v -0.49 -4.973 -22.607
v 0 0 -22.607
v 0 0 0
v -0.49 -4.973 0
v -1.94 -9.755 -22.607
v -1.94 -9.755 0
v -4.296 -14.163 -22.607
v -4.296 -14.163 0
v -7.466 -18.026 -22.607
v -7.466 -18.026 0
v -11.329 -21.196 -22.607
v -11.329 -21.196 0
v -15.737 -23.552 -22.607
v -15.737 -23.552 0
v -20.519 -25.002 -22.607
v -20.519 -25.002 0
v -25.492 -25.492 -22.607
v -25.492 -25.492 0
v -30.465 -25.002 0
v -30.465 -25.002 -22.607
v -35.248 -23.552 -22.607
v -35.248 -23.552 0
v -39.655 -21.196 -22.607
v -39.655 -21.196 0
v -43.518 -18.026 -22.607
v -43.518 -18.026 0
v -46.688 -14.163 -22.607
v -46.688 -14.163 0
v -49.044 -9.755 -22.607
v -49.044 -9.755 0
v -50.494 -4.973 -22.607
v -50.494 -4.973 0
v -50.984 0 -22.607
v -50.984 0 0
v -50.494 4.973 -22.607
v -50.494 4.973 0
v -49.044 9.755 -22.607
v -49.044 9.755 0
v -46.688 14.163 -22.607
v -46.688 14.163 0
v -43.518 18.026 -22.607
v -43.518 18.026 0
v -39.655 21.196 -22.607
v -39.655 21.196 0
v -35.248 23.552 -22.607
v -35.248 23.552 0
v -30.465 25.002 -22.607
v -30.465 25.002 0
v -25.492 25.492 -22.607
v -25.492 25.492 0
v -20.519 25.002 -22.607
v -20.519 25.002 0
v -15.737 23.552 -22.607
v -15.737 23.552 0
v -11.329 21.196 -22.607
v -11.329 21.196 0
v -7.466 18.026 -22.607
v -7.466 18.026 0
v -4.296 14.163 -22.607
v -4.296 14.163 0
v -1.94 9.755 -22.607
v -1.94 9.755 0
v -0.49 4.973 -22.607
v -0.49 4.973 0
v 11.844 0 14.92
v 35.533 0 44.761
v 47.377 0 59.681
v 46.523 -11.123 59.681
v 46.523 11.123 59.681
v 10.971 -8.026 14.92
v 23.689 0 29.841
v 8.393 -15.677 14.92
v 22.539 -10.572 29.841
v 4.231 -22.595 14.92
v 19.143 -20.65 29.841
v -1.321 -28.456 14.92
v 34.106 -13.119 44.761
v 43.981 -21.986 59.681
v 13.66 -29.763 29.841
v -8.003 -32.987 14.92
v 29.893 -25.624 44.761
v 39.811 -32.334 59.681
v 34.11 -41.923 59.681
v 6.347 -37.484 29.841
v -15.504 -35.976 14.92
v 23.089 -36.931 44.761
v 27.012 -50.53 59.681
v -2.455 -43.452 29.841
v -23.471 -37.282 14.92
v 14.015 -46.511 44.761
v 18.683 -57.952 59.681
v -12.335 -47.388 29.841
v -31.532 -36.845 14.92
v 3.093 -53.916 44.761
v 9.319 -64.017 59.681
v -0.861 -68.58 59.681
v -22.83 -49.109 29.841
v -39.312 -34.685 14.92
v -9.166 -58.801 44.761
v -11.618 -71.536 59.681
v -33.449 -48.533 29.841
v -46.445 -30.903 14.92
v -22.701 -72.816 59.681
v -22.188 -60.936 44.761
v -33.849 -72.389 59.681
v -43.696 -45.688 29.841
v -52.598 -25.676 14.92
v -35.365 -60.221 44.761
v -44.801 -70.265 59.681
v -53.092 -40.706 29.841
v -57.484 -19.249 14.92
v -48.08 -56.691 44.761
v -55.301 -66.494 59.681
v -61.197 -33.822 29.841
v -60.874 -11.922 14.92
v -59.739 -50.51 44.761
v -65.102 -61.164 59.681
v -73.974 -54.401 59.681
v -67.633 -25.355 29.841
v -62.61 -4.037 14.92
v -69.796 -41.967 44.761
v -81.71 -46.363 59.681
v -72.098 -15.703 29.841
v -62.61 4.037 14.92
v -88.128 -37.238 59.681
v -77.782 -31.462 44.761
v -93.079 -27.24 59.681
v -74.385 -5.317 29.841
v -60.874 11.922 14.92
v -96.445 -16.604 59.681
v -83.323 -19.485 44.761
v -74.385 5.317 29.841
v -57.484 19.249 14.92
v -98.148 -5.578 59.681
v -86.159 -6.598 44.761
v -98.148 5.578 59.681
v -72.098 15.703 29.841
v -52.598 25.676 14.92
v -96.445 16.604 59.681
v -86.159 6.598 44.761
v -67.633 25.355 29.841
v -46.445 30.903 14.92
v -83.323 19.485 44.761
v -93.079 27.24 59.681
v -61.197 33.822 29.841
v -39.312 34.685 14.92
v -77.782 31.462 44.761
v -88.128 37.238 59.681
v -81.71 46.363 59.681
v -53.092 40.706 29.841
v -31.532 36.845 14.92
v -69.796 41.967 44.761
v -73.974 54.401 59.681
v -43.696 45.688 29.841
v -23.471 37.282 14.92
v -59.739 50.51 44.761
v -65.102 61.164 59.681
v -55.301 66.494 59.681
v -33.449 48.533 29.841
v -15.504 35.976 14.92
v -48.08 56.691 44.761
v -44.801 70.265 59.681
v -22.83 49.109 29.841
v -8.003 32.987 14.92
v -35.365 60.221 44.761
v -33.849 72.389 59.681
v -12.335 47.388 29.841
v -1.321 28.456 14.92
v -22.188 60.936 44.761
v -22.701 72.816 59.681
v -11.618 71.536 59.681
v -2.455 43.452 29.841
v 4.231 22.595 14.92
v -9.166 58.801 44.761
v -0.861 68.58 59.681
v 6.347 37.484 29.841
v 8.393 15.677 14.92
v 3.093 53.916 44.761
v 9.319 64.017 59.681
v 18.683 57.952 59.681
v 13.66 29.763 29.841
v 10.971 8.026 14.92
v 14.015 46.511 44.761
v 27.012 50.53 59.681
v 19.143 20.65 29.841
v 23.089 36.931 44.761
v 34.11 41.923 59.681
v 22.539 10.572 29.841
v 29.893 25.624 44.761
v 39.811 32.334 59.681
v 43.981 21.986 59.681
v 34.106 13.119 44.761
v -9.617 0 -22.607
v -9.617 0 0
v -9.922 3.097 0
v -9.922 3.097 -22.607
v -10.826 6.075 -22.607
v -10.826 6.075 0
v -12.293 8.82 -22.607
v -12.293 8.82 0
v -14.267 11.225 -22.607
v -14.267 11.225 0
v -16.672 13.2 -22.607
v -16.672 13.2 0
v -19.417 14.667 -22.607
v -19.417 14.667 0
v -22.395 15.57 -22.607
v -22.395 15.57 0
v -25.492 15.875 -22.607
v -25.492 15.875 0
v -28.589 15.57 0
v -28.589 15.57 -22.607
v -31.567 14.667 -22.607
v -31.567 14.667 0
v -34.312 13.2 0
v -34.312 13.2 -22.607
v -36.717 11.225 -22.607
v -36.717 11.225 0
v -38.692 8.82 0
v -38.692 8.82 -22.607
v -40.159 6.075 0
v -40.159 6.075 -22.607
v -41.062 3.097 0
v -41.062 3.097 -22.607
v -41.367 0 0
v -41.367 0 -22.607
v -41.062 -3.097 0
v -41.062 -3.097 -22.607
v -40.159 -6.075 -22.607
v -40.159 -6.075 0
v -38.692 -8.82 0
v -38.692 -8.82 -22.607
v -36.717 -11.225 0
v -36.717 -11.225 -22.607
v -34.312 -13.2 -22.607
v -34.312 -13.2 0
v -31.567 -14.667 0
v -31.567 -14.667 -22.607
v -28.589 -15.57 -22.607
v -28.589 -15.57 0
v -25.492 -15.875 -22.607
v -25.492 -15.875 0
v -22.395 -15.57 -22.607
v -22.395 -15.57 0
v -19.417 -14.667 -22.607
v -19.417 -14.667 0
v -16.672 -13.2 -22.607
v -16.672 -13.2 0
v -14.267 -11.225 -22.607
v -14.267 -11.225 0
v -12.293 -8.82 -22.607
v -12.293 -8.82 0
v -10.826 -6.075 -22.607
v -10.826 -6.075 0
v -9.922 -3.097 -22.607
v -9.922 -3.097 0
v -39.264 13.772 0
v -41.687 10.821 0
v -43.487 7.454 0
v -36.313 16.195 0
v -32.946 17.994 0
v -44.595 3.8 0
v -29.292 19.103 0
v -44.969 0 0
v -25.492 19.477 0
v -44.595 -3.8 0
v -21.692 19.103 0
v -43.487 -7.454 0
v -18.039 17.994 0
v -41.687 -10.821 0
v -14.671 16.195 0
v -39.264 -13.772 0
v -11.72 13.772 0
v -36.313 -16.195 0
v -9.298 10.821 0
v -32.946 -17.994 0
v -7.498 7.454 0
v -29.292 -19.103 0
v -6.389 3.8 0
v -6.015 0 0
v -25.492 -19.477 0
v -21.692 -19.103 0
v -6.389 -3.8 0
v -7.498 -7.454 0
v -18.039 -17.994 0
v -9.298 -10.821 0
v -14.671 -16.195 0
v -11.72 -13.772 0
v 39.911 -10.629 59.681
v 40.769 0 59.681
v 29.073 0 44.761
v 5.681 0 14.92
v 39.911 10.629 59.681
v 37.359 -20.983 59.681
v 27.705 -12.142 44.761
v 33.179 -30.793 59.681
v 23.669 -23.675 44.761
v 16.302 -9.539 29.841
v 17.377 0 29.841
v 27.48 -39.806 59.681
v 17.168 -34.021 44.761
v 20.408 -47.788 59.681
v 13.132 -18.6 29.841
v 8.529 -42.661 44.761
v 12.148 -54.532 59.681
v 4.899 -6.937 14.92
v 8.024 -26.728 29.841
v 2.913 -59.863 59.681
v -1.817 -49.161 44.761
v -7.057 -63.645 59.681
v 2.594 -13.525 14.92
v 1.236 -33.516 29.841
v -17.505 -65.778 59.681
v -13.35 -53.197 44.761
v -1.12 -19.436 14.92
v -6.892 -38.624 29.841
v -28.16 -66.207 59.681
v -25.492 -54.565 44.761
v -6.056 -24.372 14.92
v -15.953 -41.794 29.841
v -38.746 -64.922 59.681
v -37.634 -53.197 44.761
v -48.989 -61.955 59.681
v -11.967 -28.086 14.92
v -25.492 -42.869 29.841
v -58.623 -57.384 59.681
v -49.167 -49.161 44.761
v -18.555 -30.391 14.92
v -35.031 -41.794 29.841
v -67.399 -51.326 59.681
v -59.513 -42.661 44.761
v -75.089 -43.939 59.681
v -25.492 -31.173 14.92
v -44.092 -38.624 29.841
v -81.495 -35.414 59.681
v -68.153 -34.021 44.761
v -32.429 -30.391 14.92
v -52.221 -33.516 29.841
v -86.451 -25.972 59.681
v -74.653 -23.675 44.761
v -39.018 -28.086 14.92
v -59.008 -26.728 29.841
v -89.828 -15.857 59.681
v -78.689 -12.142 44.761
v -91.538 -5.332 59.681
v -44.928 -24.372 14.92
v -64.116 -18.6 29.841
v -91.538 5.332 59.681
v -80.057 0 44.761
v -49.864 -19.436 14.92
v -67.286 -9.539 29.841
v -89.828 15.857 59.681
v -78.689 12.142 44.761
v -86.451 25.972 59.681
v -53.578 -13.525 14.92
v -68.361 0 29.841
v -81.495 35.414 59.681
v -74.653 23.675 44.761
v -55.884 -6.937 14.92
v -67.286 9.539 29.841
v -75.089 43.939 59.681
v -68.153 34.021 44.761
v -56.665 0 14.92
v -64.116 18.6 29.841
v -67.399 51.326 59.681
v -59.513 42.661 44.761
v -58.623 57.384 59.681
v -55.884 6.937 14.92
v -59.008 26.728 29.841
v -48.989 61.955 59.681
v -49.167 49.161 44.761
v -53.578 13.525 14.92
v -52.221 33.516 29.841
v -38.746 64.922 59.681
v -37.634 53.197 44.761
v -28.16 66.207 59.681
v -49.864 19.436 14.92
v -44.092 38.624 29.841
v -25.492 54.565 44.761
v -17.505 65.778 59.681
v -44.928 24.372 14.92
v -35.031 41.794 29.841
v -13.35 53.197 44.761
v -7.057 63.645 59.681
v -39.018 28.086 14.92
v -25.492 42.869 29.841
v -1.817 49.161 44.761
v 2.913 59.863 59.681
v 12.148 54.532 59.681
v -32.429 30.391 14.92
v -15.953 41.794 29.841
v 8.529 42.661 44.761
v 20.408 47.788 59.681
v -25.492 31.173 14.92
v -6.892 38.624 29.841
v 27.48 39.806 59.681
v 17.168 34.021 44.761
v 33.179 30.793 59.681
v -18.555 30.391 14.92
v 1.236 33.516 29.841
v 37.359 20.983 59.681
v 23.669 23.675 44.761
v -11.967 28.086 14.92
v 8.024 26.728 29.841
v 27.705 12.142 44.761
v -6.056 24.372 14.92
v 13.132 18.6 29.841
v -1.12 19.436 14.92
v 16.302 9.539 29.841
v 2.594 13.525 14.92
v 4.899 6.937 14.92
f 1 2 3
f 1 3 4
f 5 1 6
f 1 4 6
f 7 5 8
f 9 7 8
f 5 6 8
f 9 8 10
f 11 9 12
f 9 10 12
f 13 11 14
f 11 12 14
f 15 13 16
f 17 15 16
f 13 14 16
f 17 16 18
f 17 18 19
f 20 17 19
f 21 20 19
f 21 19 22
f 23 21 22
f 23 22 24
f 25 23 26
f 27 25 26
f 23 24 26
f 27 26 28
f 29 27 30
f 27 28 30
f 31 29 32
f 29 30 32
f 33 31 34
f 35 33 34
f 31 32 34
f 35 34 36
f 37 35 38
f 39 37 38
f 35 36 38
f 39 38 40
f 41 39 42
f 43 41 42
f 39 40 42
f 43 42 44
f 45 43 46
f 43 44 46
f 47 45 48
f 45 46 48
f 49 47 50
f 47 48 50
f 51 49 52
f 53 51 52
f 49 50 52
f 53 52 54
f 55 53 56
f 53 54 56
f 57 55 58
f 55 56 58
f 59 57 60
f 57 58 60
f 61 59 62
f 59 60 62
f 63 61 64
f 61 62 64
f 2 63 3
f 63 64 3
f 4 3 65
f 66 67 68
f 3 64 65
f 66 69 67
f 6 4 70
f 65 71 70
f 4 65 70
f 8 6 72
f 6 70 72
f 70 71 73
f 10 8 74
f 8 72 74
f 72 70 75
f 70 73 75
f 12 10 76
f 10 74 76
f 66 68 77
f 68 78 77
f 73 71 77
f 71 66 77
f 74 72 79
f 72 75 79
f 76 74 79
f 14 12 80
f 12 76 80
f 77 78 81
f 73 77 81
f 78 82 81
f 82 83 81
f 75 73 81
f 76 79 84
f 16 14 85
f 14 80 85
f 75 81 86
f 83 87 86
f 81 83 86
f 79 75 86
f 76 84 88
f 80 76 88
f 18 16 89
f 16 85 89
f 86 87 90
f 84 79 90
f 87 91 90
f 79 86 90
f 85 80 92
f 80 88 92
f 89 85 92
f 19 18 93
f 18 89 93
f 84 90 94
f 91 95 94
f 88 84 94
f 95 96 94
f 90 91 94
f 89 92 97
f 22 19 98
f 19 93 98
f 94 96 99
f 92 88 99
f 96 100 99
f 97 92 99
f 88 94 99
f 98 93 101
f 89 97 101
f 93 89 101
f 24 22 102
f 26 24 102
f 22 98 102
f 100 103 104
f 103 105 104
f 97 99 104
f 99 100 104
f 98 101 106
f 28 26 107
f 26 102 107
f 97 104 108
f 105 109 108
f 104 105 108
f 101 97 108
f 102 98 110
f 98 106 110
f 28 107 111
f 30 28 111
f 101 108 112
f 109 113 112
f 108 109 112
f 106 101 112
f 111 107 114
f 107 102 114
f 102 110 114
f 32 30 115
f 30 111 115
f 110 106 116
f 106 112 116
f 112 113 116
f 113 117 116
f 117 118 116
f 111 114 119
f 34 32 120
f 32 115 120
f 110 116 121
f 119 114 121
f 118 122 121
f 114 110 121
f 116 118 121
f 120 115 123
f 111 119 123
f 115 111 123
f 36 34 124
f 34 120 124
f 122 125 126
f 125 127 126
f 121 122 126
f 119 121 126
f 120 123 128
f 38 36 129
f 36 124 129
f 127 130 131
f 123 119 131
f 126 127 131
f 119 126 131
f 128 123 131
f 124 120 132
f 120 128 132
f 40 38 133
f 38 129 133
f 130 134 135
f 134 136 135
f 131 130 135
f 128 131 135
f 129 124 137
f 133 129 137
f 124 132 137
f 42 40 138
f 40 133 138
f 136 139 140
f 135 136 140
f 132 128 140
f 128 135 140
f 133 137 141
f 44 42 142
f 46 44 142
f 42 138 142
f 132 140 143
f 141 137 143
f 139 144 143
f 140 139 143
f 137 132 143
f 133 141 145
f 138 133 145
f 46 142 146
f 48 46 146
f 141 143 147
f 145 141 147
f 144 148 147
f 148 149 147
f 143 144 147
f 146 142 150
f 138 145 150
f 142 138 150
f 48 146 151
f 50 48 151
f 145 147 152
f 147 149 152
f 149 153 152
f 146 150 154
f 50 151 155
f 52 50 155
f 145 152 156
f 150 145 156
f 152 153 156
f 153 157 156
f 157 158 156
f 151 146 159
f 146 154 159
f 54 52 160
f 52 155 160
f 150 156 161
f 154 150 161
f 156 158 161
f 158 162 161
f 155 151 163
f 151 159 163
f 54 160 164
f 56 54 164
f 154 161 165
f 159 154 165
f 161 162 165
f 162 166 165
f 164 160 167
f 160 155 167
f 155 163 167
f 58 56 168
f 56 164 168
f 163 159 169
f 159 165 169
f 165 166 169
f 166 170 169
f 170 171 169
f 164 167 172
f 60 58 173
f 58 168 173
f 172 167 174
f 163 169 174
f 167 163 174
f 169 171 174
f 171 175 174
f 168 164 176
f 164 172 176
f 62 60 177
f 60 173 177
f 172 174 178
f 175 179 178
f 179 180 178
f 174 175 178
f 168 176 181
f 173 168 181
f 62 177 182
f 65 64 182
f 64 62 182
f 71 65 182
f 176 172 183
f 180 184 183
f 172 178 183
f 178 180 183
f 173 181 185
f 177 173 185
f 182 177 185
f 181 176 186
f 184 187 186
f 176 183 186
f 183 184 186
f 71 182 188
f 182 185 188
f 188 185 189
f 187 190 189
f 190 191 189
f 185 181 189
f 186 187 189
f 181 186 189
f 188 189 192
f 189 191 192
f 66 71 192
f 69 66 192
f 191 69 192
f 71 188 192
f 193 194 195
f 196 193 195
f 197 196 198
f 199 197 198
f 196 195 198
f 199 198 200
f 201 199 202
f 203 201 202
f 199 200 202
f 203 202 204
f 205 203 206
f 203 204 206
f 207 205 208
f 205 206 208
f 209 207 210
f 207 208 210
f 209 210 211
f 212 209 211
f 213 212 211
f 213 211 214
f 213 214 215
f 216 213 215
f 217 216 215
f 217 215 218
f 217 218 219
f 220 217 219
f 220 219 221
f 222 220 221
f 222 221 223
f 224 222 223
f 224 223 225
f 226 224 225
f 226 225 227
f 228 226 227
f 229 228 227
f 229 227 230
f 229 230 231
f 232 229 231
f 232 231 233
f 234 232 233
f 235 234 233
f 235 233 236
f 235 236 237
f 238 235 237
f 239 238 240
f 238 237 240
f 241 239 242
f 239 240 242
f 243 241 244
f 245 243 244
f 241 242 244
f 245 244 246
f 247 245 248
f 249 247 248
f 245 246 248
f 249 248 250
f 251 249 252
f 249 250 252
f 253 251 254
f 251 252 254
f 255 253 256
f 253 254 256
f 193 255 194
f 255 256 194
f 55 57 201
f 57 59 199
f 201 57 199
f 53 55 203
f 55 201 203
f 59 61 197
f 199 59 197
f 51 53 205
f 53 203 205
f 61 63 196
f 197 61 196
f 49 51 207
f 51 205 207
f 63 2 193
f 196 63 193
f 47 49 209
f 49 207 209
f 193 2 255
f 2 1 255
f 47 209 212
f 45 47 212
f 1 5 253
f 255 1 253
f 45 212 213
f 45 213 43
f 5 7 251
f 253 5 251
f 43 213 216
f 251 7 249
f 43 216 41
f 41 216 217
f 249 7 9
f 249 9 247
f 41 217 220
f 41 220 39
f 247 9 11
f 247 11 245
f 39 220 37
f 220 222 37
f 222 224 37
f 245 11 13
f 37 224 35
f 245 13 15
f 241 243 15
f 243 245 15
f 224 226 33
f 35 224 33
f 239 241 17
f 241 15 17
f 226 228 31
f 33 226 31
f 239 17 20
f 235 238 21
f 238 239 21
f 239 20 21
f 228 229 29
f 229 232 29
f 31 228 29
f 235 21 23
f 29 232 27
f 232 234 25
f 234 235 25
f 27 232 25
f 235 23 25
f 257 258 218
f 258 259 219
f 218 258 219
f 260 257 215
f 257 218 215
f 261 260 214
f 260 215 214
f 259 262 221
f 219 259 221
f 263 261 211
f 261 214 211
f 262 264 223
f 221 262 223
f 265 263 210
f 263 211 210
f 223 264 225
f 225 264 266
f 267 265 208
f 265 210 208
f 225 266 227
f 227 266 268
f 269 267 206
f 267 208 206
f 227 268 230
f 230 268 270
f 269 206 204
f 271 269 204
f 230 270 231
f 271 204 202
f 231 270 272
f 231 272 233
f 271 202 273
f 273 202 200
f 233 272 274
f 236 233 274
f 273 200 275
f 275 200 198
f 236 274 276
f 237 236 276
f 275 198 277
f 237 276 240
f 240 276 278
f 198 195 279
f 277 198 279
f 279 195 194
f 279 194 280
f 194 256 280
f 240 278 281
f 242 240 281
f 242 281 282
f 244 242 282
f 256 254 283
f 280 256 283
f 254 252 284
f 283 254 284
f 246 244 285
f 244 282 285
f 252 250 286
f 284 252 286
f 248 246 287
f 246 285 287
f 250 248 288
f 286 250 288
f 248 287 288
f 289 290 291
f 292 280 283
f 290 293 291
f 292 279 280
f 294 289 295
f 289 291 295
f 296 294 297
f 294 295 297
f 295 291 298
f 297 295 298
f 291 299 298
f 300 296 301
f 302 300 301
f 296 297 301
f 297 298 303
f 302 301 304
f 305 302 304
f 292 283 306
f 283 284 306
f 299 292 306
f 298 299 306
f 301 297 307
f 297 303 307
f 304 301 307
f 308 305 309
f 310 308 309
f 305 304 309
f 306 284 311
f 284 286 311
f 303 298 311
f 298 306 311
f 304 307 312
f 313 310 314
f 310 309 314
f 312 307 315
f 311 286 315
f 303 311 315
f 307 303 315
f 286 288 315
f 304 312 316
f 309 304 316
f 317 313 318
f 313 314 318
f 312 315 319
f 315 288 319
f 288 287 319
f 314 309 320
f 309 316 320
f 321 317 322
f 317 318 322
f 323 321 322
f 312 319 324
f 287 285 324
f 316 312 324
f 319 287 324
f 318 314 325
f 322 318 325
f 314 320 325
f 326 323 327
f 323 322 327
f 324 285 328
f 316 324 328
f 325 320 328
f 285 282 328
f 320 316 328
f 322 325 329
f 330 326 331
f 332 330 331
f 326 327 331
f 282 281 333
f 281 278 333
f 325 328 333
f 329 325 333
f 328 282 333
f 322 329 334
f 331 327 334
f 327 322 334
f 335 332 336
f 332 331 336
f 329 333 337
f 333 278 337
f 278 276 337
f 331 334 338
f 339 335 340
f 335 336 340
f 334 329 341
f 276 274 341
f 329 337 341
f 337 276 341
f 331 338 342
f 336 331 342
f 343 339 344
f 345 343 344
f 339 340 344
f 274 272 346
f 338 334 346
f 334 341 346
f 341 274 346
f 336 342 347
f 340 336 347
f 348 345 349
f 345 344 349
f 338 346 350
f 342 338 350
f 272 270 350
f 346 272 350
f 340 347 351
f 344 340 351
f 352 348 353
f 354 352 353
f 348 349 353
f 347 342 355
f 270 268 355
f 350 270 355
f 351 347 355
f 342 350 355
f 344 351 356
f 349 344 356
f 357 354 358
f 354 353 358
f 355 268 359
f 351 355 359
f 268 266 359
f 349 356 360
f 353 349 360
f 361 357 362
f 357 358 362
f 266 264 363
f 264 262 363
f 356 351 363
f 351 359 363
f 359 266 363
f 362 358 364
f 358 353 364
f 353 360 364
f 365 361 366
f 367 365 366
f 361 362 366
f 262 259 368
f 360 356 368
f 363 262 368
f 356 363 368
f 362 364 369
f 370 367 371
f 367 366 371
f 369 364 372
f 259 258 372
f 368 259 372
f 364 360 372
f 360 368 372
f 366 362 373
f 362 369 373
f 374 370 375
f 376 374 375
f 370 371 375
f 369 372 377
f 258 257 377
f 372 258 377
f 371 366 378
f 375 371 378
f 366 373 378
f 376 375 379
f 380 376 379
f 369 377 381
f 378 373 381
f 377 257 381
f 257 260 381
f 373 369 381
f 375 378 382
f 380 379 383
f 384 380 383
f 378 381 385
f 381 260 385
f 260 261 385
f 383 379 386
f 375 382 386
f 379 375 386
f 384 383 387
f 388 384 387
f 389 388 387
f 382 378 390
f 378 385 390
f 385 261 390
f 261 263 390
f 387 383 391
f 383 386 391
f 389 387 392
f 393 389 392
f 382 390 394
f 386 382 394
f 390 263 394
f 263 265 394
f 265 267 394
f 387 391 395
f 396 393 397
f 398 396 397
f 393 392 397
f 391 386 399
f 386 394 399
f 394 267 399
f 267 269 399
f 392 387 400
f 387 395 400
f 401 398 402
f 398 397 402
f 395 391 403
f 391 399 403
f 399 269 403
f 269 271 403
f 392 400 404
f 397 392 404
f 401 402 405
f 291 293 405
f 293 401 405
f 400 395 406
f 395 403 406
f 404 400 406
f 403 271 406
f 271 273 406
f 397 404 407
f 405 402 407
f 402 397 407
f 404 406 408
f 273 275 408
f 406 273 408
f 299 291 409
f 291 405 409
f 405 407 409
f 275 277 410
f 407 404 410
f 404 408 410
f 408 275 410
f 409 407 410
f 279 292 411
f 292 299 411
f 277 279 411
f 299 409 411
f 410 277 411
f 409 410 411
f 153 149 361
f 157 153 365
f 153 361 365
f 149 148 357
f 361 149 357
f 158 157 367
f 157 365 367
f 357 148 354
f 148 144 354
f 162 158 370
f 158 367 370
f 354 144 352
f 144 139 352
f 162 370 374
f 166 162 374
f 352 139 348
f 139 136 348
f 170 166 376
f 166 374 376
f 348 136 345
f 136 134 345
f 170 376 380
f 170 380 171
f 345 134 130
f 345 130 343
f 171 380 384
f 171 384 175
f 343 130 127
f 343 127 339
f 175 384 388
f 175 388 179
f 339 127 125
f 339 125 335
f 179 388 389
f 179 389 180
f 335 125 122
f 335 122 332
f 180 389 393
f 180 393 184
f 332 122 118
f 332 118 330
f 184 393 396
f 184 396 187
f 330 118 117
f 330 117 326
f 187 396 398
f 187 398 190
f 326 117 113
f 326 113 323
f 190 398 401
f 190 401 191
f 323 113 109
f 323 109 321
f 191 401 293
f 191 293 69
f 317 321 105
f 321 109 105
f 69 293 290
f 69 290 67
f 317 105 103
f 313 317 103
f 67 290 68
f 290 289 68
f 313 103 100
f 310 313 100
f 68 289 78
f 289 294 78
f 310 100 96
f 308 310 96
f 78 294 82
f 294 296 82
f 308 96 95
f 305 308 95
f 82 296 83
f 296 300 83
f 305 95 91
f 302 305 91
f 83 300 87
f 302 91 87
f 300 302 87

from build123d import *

# Parameters (mm, degrees)
F4_R     = 15.875
F5_DEPTH = 76.2


# Not quite as in the source:
# - a feature of the source that left no trace in its solid (it failed there, or was rolled back) is left out


with BuildPart() as f1:
    # F0 (on Front) → F1 (revolve)
    with BuildSketch(Plane.XZ):
        Polygon((0, -22.6070340723), (0, 0), (47.3772140821, 59.6811493339), (40.7688170671, 59.6811493339), (-6.0150707141, 0), (-25.4921261221, 0), (-25.4921261221, -22.6070340723), align=None)
    revolve(axis=Axis((-25.4921261221, 0, -11.3035170361), (0, 0, -1)))

    # F4 (on face) → F5 (cut)
    with BuildSketch(Plane.XY):
        with Locations((-25.4921261221, 0)):
            Circle(F4_R)
    extrude(amount=-F5_DEPTH, mode=Mode.SUBTRACT)


solid = f1.part
